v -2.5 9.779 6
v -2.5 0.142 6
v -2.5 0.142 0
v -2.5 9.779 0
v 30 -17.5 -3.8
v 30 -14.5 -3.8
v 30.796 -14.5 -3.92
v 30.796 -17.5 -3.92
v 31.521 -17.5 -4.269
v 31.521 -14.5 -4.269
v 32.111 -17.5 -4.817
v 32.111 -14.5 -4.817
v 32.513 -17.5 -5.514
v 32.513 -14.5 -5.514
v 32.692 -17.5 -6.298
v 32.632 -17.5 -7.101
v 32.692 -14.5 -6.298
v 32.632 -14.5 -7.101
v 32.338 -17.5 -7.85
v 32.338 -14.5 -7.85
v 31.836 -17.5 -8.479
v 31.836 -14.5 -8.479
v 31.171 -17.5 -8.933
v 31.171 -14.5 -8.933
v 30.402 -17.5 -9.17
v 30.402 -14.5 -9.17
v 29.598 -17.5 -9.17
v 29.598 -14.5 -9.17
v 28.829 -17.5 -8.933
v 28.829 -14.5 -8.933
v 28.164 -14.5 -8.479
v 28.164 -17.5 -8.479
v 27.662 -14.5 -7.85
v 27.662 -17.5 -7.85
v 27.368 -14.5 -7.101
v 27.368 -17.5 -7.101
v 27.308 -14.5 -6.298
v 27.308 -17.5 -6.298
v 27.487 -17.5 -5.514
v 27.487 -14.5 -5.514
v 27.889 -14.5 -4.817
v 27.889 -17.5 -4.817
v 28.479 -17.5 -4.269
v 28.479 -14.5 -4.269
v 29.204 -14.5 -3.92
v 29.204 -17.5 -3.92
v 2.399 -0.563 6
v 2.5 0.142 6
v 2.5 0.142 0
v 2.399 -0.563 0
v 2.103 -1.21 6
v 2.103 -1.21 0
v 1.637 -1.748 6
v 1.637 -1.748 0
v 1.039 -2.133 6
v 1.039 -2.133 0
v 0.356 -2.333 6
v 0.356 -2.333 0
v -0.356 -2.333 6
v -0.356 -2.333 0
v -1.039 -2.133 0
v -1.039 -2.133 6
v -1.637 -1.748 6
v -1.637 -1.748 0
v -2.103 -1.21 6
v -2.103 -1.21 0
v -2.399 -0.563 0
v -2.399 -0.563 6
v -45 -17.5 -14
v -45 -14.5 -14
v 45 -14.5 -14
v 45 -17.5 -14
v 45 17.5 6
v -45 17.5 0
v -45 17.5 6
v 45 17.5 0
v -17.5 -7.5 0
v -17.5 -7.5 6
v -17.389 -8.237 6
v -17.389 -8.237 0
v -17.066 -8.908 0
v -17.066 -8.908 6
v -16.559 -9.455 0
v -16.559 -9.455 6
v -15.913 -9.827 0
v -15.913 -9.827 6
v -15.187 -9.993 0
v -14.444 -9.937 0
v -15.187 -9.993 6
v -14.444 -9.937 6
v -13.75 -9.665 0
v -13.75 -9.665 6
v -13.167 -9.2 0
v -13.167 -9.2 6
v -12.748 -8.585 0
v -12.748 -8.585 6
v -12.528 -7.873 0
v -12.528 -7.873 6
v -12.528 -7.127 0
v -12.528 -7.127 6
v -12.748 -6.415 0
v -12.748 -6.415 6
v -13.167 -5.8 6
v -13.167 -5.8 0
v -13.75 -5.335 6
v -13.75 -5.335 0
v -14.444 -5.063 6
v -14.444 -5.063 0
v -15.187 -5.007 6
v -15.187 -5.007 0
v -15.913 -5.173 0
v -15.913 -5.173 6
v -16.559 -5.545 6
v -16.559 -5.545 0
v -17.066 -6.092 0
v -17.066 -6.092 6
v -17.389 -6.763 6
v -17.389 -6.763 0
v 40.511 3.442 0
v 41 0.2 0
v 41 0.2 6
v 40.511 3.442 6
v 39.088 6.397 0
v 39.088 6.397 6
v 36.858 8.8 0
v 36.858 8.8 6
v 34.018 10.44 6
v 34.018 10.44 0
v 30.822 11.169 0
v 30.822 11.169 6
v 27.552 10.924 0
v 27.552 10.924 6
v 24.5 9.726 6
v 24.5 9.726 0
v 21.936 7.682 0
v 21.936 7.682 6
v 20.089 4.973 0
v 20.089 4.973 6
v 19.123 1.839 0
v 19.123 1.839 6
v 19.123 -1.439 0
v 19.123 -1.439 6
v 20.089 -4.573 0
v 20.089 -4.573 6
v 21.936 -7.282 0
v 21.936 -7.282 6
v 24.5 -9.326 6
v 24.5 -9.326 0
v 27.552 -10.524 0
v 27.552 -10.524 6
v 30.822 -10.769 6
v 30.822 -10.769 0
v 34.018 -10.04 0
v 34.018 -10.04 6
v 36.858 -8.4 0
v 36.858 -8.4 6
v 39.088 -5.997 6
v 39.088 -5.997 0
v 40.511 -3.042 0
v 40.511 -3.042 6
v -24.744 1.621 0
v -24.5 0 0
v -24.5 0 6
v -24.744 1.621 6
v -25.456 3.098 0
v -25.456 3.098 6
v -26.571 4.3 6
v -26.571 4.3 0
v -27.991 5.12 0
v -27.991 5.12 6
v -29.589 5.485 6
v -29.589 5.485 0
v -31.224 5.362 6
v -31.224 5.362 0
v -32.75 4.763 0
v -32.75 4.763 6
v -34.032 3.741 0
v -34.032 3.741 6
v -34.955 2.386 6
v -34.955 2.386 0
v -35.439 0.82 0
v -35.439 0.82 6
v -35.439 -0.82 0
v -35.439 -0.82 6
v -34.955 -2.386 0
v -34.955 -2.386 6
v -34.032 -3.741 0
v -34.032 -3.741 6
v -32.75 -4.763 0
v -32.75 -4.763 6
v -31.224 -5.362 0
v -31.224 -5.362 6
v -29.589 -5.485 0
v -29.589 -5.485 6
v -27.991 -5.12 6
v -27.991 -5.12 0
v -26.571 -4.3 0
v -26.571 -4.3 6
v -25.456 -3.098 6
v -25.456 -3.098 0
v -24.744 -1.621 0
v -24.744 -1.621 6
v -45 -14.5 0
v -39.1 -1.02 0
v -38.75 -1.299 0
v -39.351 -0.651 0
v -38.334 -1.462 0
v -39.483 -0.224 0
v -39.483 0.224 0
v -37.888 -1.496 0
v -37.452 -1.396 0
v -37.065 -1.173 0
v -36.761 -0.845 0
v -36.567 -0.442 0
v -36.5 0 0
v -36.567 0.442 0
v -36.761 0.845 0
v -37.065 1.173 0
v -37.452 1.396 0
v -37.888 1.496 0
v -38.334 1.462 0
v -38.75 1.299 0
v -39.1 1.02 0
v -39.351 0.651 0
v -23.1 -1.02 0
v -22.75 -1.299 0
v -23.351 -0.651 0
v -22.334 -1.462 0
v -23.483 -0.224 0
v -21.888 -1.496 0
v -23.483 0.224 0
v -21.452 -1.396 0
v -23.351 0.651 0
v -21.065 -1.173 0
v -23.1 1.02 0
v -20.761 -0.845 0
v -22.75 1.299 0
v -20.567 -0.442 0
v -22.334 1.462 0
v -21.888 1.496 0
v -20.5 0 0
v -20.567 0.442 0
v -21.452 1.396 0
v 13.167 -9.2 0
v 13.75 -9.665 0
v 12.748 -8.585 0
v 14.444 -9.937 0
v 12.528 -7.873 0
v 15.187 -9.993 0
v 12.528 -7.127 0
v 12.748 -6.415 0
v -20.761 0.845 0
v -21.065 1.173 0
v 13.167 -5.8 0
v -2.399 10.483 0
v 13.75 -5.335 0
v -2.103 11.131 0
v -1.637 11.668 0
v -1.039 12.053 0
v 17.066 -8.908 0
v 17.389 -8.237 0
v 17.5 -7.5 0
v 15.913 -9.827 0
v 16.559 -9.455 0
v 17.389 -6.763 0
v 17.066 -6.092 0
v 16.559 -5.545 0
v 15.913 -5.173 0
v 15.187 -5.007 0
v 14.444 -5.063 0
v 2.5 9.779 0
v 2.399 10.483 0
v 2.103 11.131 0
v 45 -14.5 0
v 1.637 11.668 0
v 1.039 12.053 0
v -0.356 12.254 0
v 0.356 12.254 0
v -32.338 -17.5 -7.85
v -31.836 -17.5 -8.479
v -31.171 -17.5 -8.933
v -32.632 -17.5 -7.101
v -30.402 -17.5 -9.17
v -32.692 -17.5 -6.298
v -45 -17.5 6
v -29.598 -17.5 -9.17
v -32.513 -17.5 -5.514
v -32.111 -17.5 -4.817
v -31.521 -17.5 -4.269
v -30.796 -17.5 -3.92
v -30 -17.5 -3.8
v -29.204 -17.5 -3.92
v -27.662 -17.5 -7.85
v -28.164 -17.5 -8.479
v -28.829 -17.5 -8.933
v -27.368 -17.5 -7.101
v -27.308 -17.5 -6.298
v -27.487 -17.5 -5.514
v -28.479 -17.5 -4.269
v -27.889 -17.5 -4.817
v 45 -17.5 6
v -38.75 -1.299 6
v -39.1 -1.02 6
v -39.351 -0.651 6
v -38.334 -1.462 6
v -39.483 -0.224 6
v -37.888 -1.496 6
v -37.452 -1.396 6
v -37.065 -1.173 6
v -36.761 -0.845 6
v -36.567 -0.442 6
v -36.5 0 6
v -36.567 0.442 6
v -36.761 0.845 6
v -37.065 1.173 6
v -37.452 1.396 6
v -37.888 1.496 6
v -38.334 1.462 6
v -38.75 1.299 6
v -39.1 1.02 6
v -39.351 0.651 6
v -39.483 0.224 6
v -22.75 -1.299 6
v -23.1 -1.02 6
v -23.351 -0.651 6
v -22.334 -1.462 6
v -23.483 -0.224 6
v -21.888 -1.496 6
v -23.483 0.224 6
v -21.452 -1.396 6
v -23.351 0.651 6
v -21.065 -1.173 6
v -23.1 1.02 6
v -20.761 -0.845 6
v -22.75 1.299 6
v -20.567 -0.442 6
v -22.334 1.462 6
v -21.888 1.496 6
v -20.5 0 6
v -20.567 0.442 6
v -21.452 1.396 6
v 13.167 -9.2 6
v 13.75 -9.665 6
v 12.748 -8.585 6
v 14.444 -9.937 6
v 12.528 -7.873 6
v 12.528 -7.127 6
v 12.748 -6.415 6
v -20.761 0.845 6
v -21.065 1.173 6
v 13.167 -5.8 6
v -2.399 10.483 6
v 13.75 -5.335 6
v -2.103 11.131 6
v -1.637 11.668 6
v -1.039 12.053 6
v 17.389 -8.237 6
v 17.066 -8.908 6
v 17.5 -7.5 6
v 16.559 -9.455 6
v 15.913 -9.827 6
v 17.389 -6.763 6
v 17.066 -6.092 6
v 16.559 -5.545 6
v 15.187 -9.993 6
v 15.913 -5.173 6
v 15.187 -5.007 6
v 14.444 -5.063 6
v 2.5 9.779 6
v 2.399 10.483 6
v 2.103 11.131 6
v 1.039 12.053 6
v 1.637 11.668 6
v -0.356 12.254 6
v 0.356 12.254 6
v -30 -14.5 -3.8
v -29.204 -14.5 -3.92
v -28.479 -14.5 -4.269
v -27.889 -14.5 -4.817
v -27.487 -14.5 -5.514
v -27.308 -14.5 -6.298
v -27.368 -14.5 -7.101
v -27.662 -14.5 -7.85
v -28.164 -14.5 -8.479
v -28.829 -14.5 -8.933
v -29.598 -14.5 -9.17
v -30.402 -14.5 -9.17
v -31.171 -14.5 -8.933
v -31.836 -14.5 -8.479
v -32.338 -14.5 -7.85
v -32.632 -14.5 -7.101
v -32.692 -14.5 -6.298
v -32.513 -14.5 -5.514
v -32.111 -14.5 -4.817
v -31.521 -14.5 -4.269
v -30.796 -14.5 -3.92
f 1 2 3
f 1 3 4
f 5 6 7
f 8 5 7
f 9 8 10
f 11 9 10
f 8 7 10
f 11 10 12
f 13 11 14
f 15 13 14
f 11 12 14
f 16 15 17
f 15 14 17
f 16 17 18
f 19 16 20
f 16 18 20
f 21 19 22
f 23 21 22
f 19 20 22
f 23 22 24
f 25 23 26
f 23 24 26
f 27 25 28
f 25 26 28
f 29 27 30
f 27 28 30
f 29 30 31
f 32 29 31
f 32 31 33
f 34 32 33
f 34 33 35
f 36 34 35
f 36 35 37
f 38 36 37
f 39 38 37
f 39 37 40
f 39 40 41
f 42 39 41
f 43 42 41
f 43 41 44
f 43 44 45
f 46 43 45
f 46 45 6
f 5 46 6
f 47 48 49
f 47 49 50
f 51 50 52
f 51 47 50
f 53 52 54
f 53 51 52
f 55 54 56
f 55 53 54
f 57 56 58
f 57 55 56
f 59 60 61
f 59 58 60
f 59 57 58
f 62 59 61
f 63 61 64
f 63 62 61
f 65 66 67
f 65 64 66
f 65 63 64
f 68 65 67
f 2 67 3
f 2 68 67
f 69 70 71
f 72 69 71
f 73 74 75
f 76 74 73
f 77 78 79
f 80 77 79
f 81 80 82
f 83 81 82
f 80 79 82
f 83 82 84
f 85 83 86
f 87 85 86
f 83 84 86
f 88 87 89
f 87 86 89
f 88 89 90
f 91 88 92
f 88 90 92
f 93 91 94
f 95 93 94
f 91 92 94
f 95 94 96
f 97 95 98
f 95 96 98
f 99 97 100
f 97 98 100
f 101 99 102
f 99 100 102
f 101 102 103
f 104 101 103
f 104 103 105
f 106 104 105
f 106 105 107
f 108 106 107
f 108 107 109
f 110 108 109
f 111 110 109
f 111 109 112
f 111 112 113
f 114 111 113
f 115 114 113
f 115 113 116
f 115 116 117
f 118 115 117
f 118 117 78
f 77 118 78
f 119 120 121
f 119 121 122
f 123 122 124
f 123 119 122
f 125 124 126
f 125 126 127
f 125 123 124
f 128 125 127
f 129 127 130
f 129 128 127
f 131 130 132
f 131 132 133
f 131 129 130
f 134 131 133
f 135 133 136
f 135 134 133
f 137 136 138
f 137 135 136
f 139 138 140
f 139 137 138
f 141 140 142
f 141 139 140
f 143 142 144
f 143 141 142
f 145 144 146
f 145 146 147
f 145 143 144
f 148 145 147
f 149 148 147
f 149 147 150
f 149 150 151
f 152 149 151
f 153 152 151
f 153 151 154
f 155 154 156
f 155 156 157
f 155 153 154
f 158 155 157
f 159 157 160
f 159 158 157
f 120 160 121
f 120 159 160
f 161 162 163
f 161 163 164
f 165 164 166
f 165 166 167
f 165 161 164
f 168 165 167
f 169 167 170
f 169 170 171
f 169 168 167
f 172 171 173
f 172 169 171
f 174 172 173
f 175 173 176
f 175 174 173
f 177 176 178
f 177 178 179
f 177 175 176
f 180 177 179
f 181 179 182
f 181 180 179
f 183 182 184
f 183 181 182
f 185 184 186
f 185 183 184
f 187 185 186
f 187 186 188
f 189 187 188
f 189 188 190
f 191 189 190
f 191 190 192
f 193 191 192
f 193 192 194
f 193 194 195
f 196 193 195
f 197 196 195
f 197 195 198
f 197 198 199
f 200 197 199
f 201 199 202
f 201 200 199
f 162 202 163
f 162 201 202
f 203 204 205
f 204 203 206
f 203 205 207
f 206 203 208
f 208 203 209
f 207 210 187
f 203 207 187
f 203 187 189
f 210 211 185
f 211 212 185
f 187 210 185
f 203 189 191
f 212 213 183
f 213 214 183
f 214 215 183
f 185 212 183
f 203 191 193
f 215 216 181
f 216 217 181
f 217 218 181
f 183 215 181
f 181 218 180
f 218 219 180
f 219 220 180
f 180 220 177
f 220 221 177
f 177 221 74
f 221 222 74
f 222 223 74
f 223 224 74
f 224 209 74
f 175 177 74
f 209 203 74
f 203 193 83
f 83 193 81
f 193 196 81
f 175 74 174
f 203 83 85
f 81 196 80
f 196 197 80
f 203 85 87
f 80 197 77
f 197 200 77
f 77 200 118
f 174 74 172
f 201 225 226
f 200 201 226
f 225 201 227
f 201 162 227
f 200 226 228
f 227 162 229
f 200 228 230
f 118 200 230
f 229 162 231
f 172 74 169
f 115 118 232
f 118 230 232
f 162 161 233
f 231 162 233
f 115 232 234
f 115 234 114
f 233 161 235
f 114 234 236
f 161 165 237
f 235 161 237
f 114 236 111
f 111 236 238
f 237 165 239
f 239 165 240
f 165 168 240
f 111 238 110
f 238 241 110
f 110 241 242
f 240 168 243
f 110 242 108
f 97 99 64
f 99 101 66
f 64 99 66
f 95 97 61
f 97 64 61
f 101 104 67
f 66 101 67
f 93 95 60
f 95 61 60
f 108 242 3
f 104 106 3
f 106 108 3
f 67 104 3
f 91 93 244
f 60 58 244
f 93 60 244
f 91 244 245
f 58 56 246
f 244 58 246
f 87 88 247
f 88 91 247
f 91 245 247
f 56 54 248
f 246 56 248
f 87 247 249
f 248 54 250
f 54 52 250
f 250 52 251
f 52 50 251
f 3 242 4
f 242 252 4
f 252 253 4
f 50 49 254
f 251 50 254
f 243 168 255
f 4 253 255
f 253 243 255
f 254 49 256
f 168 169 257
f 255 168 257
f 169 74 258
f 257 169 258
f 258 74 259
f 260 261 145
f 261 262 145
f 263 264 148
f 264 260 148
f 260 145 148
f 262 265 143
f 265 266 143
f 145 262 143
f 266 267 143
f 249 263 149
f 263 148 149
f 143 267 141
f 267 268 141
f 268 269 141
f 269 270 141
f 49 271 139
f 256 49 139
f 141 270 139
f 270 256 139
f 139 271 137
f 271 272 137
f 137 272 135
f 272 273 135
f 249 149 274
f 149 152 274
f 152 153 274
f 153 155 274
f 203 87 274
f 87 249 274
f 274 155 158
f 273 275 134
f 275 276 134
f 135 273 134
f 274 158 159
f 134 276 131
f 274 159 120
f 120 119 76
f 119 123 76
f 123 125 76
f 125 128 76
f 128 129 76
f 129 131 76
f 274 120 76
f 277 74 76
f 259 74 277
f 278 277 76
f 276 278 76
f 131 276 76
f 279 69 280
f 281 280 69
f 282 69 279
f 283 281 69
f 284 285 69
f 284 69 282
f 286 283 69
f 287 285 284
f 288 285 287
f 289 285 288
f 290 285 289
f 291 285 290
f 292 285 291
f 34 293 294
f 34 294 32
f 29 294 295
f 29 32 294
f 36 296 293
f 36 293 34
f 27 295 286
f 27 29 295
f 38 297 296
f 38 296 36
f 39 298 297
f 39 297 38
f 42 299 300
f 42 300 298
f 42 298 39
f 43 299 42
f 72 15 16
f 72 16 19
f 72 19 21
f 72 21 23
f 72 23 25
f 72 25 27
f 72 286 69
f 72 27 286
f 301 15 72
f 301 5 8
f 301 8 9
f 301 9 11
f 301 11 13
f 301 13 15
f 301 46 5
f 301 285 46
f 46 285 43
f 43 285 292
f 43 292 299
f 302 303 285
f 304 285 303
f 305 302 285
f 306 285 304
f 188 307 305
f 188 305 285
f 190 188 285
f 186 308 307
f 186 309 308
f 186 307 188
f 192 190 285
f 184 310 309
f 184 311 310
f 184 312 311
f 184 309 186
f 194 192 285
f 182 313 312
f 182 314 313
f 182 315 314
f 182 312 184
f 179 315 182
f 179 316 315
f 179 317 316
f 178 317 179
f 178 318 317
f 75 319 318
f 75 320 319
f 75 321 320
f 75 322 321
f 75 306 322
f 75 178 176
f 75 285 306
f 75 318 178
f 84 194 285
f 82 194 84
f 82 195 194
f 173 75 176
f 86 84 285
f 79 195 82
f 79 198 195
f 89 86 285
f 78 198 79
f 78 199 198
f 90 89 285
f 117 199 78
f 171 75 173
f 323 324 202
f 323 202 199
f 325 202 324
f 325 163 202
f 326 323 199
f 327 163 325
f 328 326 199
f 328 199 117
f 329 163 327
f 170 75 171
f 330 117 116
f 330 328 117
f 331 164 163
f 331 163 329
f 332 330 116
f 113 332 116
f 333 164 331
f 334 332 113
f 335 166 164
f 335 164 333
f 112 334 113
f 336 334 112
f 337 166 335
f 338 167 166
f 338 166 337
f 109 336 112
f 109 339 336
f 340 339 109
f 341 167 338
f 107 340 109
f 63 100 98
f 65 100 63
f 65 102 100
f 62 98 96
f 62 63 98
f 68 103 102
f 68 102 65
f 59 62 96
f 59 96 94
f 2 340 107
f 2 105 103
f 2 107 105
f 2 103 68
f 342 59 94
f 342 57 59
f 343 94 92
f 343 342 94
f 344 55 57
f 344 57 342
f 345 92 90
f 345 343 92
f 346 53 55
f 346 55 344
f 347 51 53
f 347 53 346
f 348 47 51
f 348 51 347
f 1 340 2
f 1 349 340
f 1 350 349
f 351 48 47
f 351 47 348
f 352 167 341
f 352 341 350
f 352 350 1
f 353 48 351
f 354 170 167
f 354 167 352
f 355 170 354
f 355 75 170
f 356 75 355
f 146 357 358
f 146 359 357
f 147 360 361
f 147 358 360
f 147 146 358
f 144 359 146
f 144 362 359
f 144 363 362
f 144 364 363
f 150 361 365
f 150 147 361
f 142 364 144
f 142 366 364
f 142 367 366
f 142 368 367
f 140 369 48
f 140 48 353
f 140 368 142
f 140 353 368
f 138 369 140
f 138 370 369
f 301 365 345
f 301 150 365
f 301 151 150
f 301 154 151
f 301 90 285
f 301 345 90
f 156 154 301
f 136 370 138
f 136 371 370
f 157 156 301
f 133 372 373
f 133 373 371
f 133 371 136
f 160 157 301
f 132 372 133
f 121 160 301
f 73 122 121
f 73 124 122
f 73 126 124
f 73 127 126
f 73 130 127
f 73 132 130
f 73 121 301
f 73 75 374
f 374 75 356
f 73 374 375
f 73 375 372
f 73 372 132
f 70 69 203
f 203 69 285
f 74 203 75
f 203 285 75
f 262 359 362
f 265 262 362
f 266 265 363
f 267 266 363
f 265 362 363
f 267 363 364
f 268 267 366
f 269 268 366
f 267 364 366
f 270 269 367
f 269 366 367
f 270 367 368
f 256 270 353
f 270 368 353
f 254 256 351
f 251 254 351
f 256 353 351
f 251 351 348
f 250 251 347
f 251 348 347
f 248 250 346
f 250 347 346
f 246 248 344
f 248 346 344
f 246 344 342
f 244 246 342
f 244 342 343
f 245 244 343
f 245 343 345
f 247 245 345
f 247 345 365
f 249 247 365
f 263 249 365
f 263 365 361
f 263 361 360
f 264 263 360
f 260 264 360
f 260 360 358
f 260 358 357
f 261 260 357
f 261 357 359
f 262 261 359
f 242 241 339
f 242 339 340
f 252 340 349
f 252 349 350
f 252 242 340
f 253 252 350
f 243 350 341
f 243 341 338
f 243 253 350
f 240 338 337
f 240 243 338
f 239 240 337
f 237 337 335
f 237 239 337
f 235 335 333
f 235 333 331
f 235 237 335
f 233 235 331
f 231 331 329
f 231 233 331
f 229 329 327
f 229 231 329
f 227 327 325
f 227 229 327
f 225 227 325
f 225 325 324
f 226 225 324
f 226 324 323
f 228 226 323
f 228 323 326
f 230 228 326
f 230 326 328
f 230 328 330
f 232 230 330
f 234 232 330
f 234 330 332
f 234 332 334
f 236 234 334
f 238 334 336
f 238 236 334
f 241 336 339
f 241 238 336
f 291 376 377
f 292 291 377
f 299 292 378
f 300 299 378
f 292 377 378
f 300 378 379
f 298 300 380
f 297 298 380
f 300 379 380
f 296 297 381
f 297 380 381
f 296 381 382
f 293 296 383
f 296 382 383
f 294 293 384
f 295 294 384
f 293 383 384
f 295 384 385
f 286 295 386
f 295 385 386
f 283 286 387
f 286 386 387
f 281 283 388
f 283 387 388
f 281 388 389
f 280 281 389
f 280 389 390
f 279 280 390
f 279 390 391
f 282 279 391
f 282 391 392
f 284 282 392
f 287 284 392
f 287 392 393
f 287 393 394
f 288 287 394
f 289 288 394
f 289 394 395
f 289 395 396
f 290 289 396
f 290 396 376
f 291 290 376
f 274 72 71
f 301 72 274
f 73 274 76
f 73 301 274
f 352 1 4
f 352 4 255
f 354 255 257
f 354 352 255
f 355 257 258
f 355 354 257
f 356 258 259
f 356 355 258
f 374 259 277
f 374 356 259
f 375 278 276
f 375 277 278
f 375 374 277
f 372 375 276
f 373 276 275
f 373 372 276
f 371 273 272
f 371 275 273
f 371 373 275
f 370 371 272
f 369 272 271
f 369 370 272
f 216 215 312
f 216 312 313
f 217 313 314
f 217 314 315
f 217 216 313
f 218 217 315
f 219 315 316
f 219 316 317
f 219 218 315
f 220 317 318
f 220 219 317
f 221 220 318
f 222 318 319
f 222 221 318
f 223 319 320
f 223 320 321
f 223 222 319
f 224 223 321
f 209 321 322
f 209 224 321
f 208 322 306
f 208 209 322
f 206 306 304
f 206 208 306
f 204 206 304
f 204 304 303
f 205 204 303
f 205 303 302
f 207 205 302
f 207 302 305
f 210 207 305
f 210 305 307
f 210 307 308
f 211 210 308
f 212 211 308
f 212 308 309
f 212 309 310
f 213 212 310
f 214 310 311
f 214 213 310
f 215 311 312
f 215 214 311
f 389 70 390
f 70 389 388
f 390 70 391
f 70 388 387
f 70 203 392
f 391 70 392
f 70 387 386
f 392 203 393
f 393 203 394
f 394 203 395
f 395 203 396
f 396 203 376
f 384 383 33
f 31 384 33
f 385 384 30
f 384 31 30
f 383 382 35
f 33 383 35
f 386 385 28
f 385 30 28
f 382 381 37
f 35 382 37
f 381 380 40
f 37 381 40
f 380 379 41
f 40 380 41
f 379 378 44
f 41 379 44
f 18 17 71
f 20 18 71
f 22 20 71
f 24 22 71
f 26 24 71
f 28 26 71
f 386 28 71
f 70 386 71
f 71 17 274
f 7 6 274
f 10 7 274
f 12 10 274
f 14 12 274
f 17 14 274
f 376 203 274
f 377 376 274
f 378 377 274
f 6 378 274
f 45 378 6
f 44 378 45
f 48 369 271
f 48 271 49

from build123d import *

# Parameters (mm, degrees)
SKETCH1_W           = 90
SKETCH1_H           = 35
SKETCH1_R           = 5.5
SKETCH1_R_2         = 1.5
SKETCH1_R_3         = 11
BOSS_EXTRUDE1_DEPTH = 6
SKETCH2_W           = 90
SKETCH2_H           = 3
BOSS_EXTRUDE2_DEPTH = 20
SKETCH4_R           = 2.5
CUT_EXTRUDE1_DEPTH  = 10
SKETCH5_R           = 2.7
CUT_EXTRUDE2_DEPTH  = 10


with BuildPart() as part:
    # Sketch1 → Boss-Extrude1 (new body)
    with BuildSketch(Plane.XY):
        Rectangle(SKETCH1_W, SKETCH1_H)
        with Locations((-30, 0)):
            Circle(SKETCH1_R, mode=Mode.SUBTRACT)
        with Locations((-38, 0)):
            Circle(SKETCH1_R_2, mode=Mode.SUBTRACT)
        with Locations((-22, 0)):
            Circle(SKETCH1_R_2, mode=Mode.SUBTRACT)
        with Locations((29.999666666, 0.2)):
            Circle(SKETCH1_R_3, mode=Mode.SUBTRACT)
    extrude(amount=BOSS_EXTRUDE1_DEPTH)

    # Sketch2 → Boss-Extrude2 (add)
    with BuildSketch(Plane.XY.offset(6)):
        with Locations((0, -16)):
            Rectangle(SKETCH2_W, SKETCH2_H)
    extrude(amount=-BOSS_EXTRUDE2_DEPTH)

    # Sketch4 → Cut-Extrude1 (cut)
    with BuildSketch(Plane.XY.offset(6)):
        with Locations((15, -7.5)):
            Circle(SKETCH4_R)
        with Locations(Location((-15, -7.5, 0), (0, 0, 180))):
            Circle(SKETCH4_R)
        with BuildLine():
            Line((2.5, 9.778989608), (2.5, 0.141519694))
            ThreePointArc((2.5, 0.141519694), (0, -2.358480306), (-2.5, 0.141519694))
            Line((-2.5, 0.141519694), (-2.5, 9.778989608))
            ThreePointArc((-2.5, 9.778989608), (0, 12.278989608), (2.5, 9.778989608))
        make_face()
    extrude(amount=-CUT_EXTRUDE1_DEPTH, mode=Mode.SUBTRACT)

    # Sketch5 → Cut-Extrude2 (cut)
    with BuildSketch(Plane(origin=(0, -14.5, 0), x_dir=(1, 0, 0), z_dir=(0, 1, 0))):
        with Locations(Location((30, 6.5, 0), (0, 0, 270))):
            Circle(SKETCH5_R)
        with Locations(Location((-30, 6.5, 0), (0, 0, 270))):
            Circle(SKETCH5_R)
    extrude(amount=-CUT_EXTRUDE2_DEPTH, mode=Mode.SUBTRACT)


solid = part.part
